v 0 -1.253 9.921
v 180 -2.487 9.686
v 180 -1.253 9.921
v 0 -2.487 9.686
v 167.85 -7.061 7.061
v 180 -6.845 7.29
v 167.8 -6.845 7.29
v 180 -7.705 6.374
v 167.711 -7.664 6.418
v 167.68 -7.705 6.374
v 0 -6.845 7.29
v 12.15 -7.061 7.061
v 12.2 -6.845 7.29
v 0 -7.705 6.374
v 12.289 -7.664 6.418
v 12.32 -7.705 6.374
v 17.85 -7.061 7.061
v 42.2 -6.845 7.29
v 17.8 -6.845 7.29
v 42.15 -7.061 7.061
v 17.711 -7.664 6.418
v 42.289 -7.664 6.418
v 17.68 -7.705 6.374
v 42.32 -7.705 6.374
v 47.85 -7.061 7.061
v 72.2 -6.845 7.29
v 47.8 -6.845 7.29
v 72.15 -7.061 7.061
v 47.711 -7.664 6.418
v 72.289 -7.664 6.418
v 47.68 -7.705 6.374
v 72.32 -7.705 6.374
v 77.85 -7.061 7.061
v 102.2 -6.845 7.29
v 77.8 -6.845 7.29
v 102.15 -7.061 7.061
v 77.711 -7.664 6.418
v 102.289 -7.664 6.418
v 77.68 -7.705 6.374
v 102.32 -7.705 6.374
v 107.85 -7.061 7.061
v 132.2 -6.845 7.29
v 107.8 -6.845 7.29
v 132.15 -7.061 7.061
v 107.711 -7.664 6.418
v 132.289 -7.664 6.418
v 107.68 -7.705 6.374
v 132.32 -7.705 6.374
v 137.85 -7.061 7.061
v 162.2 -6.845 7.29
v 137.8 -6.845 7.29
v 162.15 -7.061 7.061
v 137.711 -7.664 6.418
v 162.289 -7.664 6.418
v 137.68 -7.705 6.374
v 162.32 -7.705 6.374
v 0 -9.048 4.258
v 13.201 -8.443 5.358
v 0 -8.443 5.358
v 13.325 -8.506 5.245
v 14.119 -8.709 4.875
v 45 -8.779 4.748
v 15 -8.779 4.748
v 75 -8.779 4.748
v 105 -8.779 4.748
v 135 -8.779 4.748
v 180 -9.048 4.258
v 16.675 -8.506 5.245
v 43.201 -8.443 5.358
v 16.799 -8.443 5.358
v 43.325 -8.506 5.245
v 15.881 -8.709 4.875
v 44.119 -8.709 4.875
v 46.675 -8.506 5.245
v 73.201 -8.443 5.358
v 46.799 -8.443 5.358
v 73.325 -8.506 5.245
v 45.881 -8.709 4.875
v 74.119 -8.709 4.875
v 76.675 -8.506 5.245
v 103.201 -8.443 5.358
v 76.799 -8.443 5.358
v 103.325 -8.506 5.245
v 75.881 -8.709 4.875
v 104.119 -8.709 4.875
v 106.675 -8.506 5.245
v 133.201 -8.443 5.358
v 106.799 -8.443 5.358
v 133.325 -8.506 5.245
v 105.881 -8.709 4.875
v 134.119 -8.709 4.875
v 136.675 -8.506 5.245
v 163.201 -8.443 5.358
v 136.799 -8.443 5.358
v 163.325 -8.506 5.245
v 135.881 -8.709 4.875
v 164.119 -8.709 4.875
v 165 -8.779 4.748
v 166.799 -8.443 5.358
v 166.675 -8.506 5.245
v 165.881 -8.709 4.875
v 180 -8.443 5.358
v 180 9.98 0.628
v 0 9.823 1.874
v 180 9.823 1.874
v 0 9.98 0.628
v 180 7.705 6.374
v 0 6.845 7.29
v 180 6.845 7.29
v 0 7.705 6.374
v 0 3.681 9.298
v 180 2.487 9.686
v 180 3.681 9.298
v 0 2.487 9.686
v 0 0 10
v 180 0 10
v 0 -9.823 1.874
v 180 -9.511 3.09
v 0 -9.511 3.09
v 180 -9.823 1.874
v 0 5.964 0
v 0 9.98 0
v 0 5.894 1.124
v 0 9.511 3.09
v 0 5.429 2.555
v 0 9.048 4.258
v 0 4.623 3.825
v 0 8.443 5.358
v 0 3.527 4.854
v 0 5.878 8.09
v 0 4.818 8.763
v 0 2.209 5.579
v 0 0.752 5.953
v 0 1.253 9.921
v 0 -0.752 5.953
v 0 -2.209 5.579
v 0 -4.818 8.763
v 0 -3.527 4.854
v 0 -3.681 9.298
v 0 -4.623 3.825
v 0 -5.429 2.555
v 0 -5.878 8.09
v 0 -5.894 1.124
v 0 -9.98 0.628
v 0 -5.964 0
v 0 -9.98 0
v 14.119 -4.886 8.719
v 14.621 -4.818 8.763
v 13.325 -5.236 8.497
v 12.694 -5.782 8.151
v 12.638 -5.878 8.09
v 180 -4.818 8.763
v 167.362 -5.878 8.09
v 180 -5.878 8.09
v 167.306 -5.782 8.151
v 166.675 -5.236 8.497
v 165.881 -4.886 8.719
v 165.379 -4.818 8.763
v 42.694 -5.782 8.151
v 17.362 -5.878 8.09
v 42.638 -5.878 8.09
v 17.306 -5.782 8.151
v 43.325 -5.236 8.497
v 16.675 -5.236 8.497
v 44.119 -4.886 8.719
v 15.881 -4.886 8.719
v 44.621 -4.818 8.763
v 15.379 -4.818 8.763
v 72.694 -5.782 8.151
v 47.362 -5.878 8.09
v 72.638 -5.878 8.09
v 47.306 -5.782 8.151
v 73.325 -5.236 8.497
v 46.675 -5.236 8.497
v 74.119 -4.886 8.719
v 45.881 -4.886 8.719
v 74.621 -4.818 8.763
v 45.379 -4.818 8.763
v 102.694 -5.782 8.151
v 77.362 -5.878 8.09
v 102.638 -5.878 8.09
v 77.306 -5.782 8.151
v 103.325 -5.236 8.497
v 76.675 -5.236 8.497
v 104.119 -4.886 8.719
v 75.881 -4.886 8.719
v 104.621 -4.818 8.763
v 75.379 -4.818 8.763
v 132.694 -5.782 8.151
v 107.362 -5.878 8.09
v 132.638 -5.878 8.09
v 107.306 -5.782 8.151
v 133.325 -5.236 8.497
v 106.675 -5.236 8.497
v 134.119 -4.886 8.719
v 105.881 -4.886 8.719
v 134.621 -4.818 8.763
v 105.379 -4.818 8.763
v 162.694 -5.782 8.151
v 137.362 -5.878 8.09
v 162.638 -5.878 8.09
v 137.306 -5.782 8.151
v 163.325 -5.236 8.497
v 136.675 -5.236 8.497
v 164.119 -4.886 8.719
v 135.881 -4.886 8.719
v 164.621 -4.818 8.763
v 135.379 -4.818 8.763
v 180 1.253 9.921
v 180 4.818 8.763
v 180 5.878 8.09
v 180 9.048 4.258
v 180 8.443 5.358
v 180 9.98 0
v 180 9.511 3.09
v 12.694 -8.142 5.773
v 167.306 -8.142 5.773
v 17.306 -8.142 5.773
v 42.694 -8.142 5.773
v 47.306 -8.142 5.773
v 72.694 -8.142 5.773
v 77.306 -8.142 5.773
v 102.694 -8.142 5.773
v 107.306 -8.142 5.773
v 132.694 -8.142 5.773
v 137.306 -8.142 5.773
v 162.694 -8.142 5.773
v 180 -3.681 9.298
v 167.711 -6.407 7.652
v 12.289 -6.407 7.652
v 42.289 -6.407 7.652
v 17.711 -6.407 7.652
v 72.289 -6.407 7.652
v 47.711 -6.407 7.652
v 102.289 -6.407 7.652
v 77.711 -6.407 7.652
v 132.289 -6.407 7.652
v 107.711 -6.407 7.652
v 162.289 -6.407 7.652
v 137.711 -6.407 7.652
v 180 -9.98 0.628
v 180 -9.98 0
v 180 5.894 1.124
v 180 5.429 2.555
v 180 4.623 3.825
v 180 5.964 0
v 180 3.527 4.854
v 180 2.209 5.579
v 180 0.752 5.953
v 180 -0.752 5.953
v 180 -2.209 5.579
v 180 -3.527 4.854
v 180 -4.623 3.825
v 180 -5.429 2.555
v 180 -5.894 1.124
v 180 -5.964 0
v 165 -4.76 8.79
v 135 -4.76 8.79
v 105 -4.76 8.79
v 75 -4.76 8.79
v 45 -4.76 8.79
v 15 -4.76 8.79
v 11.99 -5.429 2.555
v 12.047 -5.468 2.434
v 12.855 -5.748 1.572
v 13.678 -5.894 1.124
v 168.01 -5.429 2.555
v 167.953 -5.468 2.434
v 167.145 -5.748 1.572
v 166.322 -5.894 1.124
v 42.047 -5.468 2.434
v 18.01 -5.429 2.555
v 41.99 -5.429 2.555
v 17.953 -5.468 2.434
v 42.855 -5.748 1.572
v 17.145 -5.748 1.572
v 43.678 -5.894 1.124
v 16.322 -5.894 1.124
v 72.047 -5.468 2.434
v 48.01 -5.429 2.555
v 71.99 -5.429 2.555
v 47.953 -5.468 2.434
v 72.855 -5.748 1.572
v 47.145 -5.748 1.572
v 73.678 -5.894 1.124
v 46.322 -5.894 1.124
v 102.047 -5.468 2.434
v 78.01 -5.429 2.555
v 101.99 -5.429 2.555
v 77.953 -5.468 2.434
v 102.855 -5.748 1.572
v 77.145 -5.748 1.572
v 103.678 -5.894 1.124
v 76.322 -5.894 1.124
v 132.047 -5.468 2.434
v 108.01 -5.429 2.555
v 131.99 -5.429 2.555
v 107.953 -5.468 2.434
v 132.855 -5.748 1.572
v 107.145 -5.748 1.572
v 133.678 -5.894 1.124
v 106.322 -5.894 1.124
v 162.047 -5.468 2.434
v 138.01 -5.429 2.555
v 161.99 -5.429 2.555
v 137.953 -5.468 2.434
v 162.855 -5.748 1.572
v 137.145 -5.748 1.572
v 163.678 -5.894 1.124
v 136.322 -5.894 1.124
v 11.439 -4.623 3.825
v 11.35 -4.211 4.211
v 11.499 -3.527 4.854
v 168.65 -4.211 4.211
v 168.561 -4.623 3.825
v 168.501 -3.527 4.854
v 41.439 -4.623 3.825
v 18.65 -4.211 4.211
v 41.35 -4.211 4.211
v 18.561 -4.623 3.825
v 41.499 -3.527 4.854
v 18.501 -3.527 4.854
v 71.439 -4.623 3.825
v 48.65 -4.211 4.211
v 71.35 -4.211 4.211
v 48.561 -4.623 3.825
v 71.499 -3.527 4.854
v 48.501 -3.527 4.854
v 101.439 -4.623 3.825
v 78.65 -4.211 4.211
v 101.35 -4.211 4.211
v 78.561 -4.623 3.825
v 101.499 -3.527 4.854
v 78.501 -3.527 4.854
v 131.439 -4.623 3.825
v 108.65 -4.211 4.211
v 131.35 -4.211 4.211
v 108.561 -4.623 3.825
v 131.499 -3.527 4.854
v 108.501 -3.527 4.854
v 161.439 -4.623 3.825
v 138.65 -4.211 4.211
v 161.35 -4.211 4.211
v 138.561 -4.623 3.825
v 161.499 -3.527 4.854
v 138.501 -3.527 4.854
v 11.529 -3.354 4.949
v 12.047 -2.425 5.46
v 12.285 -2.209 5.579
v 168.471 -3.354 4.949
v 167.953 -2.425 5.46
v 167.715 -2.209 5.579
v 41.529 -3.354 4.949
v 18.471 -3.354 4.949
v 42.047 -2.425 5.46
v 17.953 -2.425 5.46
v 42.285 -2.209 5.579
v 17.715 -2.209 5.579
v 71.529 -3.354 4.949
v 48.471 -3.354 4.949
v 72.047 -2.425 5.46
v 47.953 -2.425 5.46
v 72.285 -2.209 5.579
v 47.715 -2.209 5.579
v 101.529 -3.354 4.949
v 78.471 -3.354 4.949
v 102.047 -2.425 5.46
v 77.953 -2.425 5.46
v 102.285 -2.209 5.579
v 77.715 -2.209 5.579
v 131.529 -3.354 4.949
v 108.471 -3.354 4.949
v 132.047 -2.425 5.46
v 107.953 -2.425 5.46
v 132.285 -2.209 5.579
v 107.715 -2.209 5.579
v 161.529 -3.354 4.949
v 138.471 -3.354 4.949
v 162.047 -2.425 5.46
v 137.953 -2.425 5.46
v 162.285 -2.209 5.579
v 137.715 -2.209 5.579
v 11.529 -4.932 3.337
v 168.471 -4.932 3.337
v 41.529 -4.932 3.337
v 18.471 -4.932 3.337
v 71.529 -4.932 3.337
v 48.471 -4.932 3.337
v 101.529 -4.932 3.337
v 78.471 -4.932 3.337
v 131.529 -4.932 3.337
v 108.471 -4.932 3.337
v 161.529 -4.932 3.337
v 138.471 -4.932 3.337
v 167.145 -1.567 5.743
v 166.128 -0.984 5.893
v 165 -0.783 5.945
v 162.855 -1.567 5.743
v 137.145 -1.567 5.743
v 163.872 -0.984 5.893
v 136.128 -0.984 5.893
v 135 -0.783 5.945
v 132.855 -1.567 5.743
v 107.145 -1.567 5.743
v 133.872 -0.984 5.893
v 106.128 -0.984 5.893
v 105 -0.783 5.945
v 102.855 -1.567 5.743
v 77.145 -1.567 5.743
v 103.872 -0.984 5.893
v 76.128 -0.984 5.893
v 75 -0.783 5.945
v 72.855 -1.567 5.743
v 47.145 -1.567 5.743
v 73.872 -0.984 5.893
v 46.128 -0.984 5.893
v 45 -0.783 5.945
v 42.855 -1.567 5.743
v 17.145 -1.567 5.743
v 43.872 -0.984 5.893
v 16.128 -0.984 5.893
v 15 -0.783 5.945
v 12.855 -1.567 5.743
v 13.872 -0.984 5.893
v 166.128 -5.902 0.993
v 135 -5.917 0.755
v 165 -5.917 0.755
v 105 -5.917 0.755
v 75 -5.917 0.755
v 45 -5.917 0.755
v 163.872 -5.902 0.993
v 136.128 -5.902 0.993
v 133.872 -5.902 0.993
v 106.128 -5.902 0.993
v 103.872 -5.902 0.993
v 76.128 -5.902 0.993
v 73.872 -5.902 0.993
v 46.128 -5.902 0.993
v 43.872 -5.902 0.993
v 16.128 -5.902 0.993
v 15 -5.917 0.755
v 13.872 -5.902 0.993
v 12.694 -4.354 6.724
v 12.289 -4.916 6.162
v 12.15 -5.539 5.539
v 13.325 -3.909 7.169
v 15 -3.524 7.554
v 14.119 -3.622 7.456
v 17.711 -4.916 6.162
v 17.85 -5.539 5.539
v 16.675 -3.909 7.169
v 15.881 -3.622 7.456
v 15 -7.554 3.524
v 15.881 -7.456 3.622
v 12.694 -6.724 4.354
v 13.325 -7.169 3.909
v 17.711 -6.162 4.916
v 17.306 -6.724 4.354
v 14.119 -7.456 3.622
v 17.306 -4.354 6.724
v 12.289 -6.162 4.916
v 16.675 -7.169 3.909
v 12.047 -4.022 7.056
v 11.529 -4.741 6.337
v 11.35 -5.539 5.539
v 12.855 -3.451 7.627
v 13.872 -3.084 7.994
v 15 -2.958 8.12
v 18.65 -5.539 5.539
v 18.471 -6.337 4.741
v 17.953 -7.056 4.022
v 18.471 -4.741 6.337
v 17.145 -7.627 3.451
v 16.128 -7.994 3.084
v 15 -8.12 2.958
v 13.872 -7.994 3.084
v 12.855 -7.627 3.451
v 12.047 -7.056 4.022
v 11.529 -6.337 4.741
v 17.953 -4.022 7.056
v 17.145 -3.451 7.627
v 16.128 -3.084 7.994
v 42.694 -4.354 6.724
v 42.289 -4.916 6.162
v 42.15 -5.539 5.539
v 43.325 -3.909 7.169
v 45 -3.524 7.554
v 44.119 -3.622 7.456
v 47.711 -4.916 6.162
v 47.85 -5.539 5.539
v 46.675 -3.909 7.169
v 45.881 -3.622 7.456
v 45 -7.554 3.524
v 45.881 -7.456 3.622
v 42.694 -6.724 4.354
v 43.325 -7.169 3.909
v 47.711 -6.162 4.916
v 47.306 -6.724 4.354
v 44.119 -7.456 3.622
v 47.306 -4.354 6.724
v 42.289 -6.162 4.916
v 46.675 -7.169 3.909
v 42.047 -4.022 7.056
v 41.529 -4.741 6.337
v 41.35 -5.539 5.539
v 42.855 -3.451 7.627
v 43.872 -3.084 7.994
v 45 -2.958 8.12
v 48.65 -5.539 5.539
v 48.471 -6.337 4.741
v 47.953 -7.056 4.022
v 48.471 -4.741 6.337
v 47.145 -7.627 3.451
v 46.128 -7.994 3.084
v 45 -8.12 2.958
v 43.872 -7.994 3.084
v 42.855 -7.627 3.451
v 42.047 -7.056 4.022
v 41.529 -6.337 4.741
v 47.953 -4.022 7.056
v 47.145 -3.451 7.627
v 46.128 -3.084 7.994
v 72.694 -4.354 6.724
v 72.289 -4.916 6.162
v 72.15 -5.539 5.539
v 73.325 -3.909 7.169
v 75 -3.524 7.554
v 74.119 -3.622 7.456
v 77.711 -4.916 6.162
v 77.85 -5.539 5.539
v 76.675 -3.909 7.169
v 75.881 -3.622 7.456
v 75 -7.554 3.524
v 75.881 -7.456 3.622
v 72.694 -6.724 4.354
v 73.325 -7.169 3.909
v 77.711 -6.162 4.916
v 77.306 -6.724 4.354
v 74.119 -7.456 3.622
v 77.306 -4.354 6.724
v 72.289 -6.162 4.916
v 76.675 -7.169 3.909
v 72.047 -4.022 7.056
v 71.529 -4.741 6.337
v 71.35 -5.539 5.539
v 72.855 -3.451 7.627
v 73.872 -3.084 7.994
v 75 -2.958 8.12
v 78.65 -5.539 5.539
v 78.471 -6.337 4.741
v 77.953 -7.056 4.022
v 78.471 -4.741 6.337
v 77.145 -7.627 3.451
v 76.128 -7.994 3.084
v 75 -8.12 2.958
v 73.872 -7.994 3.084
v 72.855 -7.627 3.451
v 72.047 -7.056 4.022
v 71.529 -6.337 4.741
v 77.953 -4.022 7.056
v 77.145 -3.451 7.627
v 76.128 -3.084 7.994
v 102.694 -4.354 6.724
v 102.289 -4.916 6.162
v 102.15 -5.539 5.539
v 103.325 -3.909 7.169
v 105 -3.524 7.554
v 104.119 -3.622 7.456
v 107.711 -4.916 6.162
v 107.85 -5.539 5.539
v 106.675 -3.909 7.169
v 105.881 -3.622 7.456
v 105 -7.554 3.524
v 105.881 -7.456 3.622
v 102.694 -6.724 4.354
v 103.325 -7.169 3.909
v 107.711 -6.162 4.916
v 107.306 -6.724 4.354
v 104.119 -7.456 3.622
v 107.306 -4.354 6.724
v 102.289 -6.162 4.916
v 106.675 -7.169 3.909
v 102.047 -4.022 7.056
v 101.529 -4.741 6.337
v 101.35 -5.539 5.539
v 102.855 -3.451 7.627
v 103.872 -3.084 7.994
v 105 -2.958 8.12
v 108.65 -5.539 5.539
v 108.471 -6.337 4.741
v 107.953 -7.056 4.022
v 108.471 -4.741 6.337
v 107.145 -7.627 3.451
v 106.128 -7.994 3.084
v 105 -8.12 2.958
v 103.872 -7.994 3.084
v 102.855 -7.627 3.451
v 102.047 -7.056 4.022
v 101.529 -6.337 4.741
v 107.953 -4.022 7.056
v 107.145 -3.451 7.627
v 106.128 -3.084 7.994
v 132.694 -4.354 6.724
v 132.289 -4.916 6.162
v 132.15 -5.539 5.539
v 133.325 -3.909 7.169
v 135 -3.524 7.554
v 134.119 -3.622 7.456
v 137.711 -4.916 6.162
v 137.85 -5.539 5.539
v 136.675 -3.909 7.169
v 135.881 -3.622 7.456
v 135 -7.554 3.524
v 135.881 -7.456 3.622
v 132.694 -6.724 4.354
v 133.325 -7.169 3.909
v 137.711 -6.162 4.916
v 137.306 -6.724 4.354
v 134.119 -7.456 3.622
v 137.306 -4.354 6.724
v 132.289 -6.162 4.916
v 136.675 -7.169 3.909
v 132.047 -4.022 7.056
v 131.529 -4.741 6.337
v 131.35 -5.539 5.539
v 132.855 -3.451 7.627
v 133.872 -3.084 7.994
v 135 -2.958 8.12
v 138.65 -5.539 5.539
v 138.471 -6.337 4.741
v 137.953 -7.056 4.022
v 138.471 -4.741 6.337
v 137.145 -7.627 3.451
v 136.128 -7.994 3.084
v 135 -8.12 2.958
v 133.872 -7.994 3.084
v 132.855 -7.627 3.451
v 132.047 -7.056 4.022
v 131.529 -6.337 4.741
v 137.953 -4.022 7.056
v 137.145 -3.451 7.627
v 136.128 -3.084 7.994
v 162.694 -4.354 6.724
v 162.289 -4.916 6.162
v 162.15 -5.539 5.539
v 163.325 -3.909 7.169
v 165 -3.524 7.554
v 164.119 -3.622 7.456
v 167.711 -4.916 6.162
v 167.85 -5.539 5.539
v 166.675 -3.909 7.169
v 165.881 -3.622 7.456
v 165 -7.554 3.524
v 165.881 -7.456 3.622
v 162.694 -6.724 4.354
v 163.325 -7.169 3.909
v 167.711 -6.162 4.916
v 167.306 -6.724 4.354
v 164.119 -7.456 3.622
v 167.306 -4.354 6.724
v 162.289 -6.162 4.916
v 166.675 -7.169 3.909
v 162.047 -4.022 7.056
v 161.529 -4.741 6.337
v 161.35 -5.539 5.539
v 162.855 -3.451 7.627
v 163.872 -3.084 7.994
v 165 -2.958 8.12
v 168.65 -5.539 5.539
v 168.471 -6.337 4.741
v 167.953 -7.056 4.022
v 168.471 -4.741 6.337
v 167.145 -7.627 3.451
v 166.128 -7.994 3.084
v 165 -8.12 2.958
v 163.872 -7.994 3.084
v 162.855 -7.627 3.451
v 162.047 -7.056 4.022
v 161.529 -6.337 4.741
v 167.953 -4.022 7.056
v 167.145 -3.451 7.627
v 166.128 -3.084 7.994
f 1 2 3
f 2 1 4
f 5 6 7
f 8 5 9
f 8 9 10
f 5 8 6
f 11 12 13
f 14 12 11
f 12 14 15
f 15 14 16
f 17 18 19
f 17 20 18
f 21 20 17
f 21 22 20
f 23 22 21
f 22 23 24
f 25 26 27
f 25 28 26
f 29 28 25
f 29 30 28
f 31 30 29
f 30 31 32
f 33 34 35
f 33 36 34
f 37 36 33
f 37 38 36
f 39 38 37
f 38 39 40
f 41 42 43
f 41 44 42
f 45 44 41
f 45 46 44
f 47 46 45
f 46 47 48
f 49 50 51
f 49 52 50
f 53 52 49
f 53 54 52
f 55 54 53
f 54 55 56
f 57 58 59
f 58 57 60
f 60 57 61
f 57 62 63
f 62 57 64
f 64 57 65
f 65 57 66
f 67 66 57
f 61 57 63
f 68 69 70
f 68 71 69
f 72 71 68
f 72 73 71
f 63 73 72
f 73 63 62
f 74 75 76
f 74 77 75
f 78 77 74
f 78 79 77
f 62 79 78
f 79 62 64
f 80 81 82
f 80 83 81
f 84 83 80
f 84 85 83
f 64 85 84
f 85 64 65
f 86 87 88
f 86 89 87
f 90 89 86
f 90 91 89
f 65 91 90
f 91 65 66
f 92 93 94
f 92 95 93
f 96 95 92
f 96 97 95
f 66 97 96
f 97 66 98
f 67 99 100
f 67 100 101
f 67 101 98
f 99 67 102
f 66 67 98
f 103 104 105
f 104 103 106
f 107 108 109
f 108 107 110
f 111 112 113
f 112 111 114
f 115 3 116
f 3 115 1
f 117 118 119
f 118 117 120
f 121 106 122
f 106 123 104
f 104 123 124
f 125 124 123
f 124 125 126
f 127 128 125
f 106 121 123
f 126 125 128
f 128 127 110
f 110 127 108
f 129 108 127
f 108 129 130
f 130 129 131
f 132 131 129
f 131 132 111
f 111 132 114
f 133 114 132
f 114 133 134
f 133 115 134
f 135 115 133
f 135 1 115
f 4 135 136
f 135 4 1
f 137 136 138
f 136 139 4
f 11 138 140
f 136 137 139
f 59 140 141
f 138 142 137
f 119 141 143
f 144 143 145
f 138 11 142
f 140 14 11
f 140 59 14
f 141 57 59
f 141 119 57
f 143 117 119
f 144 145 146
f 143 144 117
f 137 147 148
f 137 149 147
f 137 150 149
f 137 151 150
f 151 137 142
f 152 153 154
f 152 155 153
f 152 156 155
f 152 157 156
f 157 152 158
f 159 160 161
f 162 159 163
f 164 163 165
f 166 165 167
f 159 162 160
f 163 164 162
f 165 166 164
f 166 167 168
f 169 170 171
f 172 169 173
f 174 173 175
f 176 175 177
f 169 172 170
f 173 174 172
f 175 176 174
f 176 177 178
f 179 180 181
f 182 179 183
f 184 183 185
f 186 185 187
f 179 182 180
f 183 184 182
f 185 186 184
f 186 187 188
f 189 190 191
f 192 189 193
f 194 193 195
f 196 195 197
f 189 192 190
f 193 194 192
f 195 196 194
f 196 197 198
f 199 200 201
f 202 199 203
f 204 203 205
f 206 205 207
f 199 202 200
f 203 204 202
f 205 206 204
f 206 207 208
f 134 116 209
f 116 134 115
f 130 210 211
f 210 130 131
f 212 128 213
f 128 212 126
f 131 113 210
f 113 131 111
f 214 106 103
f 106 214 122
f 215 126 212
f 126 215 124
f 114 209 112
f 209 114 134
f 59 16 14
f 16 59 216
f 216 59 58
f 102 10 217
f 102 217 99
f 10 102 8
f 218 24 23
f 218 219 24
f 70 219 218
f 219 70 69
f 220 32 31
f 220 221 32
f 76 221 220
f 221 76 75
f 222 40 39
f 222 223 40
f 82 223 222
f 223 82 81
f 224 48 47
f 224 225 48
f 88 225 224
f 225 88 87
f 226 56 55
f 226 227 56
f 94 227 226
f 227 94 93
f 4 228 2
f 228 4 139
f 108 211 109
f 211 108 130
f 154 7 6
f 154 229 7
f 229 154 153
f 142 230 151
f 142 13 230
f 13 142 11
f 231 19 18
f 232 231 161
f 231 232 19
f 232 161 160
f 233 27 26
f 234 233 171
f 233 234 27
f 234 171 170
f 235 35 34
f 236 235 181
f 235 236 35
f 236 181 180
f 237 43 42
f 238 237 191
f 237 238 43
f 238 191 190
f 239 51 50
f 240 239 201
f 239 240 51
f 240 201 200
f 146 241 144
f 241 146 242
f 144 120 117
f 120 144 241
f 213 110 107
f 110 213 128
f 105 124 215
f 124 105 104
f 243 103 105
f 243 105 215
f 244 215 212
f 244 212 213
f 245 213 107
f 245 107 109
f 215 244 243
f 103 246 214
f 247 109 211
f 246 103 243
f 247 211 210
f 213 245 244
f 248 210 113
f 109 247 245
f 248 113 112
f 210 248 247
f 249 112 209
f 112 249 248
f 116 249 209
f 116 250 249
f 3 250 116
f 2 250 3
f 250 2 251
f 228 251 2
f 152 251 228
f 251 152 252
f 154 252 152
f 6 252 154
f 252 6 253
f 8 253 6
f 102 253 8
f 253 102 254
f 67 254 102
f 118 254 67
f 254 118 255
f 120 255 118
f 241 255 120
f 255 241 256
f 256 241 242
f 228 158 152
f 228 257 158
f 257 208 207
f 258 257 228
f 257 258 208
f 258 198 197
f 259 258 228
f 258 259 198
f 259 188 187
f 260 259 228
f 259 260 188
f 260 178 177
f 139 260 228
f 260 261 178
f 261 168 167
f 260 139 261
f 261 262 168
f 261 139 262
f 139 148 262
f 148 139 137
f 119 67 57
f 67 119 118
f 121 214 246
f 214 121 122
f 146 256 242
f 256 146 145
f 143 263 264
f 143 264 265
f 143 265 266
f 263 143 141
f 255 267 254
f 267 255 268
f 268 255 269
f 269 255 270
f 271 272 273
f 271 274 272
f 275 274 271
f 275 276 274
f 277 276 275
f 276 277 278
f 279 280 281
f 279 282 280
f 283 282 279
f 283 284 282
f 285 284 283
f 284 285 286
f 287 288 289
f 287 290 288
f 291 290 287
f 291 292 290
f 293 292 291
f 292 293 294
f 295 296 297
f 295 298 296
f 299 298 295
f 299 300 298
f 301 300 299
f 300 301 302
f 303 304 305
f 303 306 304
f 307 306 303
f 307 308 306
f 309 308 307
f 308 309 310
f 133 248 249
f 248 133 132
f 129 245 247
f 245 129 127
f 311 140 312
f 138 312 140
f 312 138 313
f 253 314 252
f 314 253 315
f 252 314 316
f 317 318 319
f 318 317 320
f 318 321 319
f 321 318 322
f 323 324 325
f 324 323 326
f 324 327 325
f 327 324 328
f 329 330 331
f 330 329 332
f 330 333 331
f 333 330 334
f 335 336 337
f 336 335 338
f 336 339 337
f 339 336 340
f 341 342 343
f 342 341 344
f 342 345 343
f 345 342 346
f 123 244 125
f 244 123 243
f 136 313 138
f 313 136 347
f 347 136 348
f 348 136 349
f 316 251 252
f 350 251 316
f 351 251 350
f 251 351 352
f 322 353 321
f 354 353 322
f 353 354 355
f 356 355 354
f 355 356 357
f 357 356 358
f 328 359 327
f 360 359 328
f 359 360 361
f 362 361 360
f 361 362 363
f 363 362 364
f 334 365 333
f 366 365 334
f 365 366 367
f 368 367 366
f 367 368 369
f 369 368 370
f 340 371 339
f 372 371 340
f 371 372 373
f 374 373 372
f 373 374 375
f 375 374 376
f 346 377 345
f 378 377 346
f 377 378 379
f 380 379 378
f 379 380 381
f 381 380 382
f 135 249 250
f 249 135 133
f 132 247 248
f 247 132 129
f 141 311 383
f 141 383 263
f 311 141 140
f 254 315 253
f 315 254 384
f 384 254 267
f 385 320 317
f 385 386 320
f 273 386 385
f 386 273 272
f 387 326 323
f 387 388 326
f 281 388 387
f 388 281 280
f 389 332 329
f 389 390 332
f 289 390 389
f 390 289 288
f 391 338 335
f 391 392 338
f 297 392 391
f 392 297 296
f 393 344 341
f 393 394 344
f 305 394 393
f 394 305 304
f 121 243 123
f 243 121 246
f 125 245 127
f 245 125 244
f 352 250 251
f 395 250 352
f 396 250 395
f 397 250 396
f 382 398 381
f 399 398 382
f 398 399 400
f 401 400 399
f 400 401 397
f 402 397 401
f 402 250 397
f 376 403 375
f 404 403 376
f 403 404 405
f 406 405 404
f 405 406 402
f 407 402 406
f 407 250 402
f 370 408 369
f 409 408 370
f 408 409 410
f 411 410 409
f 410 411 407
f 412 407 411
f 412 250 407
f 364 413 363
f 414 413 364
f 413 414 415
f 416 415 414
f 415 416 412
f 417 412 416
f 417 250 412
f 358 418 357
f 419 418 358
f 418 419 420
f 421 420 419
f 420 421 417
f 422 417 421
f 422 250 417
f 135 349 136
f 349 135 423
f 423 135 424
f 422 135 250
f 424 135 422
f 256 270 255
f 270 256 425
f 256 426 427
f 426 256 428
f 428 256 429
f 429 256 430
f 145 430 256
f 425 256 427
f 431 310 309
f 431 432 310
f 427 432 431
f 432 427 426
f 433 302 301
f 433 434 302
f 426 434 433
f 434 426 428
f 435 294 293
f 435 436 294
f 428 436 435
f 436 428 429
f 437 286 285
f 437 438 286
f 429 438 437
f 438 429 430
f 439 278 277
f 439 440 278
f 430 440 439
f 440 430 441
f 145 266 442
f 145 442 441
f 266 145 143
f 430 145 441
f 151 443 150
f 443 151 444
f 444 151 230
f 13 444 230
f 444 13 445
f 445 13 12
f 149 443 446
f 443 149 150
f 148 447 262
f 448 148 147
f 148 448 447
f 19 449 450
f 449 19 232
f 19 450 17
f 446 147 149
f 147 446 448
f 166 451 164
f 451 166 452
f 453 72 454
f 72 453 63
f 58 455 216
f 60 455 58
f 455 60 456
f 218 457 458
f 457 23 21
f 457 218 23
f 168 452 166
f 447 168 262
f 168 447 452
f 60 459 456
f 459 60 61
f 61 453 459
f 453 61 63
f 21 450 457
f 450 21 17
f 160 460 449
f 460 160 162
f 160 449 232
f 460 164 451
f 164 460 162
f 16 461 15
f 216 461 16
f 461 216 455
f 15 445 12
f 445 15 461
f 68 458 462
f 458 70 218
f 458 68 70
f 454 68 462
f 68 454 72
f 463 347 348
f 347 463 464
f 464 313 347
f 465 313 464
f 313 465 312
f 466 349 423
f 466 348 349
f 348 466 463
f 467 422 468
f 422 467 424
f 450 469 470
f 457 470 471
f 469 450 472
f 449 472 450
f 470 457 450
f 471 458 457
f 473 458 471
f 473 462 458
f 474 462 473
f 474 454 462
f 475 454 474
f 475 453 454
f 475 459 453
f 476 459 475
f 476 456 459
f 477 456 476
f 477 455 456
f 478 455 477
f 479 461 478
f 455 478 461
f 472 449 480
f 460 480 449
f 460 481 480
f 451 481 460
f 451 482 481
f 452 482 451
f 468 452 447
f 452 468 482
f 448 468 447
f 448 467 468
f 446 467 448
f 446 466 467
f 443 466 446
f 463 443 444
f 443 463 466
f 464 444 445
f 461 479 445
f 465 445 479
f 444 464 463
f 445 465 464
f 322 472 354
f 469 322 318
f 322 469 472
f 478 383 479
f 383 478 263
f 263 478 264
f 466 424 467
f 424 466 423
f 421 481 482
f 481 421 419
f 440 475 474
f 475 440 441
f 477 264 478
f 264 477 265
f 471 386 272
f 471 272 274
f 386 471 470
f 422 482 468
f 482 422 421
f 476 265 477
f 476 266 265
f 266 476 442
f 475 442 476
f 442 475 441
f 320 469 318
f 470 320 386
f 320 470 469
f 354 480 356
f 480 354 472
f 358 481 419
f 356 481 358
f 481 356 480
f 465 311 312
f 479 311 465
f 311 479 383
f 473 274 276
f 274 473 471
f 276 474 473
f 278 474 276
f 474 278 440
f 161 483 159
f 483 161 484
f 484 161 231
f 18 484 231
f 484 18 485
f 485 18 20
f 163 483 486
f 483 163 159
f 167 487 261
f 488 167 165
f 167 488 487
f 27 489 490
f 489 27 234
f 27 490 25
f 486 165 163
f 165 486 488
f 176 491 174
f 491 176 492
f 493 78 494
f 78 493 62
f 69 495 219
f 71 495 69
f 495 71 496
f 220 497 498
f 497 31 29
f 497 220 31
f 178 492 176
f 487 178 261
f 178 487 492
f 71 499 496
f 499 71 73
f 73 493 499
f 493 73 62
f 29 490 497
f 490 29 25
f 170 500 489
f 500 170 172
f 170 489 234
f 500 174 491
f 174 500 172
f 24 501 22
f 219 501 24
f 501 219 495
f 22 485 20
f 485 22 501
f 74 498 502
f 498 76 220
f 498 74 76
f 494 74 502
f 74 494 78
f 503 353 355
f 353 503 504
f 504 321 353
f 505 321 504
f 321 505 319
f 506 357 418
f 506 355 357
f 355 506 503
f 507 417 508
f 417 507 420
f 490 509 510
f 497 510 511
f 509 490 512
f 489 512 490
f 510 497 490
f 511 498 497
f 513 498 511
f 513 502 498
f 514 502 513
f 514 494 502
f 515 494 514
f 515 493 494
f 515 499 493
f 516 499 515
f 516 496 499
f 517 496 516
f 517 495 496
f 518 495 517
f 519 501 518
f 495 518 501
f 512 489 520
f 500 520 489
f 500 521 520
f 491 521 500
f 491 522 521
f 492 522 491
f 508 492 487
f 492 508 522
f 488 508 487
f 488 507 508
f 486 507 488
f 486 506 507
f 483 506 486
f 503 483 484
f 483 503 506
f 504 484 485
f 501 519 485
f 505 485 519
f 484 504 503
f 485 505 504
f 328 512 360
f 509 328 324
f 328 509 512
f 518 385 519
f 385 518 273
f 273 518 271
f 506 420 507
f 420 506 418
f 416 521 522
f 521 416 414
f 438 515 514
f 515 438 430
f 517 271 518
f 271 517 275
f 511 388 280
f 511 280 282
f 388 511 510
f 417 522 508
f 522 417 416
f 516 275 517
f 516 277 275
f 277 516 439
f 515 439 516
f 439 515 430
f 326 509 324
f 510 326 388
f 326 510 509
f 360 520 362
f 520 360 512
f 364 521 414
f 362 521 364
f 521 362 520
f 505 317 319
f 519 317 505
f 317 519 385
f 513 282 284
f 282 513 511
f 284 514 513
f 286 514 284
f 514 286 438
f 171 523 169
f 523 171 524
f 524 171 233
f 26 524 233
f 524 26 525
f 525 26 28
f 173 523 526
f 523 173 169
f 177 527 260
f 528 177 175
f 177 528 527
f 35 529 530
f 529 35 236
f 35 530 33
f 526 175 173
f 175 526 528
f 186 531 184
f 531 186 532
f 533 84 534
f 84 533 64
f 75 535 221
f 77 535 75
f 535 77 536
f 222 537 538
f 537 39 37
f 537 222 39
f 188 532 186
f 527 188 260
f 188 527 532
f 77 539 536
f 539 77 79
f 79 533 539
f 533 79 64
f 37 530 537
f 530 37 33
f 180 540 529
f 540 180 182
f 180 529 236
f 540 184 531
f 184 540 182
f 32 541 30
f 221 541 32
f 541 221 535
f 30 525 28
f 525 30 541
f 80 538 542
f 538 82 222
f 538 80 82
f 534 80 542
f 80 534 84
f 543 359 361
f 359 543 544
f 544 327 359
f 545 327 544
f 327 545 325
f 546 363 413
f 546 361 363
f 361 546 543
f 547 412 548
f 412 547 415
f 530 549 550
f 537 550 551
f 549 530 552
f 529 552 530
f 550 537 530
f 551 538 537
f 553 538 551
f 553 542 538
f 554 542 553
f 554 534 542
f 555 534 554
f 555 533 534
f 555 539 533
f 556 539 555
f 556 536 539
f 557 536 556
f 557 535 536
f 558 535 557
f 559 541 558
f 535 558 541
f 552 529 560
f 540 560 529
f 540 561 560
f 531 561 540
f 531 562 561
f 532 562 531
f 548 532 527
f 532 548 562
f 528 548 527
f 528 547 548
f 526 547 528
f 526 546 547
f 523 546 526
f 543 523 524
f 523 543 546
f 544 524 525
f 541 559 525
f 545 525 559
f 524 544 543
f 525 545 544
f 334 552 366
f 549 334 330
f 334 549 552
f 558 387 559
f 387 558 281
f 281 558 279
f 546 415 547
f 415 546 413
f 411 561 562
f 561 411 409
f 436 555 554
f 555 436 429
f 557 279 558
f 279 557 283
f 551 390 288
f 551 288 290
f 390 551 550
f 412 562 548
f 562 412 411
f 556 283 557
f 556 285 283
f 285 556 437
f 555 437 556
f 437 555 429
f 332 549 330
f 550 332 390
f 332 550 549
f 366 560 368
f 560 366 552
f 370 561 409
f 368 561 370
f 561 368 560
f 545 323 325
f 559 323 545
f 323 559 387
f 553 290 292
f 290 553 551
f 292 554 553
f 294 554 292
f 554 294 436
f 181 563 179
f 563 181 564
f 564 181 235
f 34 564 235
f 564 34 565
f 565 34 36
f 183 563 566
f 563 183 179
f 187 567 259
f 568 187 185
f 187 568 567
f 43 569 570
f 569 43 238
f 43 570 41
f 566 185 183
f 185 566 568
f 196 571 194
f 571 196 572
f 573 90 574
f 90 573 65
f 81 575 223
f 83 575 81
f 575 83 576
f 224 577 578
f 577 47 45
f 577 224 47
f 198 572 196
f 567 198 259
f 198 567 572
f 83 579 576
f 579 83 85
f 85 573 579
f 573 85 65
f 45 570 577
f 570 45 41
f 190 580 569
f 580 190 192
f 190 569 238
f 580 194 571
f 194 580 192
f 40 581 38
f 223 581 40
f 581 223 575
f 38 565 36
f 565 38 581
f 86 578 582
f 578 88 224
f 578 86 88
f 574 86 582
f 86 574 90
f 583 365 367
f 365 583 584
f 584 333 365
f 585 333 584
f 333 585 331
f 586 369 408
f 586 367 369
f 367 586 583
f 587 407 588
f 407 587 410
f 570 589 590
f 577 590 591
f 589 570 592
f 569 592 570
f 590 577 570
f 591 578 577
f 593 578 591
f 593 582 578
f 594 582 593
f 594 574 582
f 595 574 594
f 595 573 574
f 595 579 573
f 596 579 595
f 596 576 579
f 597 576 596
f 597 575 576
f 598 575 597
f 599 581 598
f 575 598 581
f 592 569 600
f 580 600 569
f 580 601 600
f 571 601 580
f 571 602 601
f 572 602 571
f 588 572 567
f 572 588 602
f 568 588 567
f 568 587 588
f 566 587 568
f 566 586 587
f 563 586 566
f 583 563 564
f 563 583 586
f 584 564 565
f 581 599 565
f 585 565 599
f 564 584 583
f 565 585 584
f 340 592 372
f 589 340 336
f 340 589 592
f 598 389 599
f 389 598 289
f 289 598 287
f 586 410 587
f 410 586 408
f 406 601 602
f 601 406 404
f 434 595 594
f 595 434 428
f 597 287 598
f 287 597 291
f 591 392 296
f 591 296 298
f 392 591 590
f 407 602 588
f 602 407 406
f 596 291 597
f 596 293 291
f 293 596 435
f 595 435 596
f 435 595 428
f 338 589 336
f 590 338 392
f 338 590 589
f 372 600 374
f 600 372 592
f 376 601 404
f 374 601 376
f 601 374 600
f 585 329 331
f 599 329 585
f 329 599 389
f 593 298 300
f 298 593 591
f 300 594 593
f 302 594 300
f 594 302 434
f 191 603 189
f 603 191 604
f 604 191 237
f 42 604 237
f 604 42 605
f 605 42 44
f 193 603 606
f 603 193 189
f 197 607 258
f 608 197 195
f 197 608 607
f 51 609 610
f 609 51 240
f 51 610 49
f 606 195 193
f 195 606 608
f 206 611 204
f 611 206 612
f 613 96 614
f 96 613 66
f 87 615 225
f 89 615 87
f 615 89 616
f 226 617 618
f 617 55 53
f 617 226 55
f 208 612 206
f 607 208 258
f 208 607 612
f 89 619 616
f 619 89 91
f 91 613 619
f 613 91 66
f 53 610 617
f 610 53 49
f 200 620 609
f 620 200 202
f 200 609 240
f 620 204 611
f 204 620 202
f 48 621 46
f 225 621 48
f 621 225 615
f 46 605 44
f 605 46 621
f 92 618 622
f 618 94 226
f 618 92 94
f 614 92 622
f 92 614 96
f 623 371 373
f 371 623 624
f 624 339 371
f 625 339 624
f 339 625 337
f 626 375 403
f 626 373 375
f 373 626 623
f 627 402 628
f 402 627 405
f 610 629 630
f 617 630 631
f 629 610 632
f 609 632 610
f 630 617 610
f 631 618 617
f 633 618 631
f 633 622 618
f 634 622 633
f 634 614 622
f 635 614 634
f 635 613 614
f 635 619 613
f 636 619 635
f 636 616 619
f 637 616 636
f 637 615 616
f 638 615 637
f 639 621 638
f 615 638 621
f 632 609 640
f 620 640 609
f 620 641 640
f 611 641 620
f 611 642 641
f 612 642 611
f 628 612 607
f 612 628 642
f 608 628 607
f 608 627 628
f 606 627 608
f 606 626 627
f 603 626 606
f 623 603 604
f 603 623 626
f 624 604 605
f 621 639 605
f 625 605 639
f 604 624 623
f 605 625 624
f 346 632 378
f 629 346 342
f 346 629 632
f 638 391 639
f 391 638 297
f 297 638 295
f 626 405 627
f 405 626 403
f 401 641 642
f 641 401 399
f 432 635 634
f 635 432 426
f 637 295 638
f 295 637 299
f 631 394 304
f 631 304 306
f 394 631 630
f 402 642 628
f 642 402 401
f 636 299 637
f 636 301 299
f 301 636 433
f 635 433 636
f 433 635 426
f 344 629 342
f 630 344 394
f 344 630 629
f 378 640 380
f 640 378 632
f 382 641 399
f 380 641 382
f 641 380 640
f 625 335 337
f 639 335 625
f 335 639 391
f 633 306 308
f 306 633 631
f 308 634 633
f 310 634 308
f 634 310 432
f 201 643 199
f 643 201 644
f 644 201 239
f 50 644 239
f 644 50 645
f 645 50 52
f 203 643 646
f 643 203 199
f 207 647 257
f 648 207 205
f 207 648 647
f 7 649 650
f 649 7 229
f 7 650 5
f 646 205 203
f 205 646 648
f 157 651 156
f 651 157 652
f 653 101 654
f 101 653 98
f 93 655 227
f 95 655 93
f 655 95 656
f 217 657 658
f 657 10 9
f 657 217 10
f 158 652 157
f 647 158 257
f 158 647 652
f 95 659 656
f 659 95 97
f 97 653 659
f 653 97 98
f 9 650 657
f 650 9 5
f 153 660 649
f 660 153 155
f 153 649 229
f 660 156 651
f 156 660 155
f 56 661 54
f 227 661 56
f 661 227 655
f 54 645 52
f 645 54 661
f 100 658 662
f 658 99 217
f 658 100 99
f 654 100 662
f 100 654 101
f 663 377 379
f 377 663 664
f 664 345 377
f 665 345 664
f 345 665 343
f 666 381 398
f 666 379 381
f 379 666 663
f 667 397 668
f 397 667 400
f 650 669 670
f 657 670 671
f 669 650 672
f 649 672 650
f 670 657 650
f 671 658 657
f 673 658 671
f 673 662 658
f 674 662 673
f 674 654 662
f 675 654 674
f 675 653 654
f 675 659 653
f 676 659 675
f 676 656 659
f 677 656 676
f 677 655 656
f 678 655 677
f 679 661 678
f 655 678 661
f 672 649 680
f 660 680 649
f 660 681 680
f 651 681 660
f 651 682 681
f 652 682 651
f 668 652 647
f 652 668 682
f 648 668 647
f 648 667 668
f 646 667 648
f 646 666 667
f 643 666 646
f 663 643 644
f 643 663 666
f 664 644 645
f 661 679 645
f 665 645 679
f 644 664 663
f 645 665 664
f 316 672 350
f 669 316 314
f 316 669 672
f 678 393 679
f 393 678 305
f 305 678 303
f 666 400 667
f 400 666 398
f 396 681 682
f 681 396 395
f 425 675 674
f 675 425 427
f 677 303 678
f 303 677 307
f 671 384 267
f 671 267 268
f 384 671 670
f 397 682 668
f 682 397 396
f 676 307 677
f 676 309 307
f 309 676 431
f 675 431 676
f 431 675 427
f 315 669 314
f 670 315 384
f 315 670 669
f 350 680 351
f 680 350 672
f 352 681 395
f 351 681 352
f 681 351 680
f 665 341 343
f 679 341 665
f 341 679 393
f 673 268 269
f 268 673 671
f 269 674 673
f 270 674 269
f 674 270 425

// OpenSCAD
/* LED Light Bar for MakerGear M2
   Version 1.0
   by Kirk Saathoff
   2013-06-06
 */

diameter = 20;
length = 180;
LED_Count = 6;
ledRotation = 45;

/* [Hidden] */
ledDiam = 5;
ledDiam2 = 6;
ledLen = 8.76;


module led()
{
	color("red") {
	sphere(r=ledDiam/2, $fn=25);
	cylinder(h=ledLen-(ledDiam/2), r=ledDiam/2, $fn=25);
	translate([0, 0, ledLen-(ledDiam/2)-1])
		cylinder(h=1, r=ledDiam2/2, $fn=25);
	}
	translate([0, 1, 0])
		cube([.25, .25, 25]);
	translate([0, -1, 0])
		cube([.25, .25, 25]);
}


module lightBar(showLEDs)
{
	spacing = length / LED_Count;
	//union()
	difference()
	{
		difference()
		{
		//	union()
			difference()
			{
				cylinder(h=length, r=diameter/2, $fn=50);
				translate([0, -diameter/2, -.02]) {
					cube([diameter/2, diameter, length+.04]);
				}
			}
			translate([0, 0, -.02])
				cylinder(h=length+.04, r=(diameter/2)-4, $fn=25);
		}
		for (ledHoleNum = [1:LED_Count]) {
			translate([0, 0, ((ledHoleNum-1)*spacing)+(spacing/2)])
				rotate([0, 90, ledRotation])
					translate([0, 0, -diameter/1.5]) {
						cylinder(h=10, r=5.7/2, $fn=20);
						translate([0, 0, 5.5]) {
							cylinder(h=5, r=7.3/2, $fn=20);
						}
					}
		}
	}
	if (showLEDs) {
		for (ledHoleNum = [1:LED_Count]) {
			translate([0, 0, ((ledHoleNum-1)*spacing)+(spacing/2)])
				rotate([0, 90, ledRotation])
					translate([0, 0, -diameter/2])
						led();
		}
	}
}

showLEDs = 0;
showTestLED = 0;

rotate([0, 90, 0])
	lightBar(showLEDs);

if (showTestLED) {
	translate([50, 50, 0])
		led();
}
